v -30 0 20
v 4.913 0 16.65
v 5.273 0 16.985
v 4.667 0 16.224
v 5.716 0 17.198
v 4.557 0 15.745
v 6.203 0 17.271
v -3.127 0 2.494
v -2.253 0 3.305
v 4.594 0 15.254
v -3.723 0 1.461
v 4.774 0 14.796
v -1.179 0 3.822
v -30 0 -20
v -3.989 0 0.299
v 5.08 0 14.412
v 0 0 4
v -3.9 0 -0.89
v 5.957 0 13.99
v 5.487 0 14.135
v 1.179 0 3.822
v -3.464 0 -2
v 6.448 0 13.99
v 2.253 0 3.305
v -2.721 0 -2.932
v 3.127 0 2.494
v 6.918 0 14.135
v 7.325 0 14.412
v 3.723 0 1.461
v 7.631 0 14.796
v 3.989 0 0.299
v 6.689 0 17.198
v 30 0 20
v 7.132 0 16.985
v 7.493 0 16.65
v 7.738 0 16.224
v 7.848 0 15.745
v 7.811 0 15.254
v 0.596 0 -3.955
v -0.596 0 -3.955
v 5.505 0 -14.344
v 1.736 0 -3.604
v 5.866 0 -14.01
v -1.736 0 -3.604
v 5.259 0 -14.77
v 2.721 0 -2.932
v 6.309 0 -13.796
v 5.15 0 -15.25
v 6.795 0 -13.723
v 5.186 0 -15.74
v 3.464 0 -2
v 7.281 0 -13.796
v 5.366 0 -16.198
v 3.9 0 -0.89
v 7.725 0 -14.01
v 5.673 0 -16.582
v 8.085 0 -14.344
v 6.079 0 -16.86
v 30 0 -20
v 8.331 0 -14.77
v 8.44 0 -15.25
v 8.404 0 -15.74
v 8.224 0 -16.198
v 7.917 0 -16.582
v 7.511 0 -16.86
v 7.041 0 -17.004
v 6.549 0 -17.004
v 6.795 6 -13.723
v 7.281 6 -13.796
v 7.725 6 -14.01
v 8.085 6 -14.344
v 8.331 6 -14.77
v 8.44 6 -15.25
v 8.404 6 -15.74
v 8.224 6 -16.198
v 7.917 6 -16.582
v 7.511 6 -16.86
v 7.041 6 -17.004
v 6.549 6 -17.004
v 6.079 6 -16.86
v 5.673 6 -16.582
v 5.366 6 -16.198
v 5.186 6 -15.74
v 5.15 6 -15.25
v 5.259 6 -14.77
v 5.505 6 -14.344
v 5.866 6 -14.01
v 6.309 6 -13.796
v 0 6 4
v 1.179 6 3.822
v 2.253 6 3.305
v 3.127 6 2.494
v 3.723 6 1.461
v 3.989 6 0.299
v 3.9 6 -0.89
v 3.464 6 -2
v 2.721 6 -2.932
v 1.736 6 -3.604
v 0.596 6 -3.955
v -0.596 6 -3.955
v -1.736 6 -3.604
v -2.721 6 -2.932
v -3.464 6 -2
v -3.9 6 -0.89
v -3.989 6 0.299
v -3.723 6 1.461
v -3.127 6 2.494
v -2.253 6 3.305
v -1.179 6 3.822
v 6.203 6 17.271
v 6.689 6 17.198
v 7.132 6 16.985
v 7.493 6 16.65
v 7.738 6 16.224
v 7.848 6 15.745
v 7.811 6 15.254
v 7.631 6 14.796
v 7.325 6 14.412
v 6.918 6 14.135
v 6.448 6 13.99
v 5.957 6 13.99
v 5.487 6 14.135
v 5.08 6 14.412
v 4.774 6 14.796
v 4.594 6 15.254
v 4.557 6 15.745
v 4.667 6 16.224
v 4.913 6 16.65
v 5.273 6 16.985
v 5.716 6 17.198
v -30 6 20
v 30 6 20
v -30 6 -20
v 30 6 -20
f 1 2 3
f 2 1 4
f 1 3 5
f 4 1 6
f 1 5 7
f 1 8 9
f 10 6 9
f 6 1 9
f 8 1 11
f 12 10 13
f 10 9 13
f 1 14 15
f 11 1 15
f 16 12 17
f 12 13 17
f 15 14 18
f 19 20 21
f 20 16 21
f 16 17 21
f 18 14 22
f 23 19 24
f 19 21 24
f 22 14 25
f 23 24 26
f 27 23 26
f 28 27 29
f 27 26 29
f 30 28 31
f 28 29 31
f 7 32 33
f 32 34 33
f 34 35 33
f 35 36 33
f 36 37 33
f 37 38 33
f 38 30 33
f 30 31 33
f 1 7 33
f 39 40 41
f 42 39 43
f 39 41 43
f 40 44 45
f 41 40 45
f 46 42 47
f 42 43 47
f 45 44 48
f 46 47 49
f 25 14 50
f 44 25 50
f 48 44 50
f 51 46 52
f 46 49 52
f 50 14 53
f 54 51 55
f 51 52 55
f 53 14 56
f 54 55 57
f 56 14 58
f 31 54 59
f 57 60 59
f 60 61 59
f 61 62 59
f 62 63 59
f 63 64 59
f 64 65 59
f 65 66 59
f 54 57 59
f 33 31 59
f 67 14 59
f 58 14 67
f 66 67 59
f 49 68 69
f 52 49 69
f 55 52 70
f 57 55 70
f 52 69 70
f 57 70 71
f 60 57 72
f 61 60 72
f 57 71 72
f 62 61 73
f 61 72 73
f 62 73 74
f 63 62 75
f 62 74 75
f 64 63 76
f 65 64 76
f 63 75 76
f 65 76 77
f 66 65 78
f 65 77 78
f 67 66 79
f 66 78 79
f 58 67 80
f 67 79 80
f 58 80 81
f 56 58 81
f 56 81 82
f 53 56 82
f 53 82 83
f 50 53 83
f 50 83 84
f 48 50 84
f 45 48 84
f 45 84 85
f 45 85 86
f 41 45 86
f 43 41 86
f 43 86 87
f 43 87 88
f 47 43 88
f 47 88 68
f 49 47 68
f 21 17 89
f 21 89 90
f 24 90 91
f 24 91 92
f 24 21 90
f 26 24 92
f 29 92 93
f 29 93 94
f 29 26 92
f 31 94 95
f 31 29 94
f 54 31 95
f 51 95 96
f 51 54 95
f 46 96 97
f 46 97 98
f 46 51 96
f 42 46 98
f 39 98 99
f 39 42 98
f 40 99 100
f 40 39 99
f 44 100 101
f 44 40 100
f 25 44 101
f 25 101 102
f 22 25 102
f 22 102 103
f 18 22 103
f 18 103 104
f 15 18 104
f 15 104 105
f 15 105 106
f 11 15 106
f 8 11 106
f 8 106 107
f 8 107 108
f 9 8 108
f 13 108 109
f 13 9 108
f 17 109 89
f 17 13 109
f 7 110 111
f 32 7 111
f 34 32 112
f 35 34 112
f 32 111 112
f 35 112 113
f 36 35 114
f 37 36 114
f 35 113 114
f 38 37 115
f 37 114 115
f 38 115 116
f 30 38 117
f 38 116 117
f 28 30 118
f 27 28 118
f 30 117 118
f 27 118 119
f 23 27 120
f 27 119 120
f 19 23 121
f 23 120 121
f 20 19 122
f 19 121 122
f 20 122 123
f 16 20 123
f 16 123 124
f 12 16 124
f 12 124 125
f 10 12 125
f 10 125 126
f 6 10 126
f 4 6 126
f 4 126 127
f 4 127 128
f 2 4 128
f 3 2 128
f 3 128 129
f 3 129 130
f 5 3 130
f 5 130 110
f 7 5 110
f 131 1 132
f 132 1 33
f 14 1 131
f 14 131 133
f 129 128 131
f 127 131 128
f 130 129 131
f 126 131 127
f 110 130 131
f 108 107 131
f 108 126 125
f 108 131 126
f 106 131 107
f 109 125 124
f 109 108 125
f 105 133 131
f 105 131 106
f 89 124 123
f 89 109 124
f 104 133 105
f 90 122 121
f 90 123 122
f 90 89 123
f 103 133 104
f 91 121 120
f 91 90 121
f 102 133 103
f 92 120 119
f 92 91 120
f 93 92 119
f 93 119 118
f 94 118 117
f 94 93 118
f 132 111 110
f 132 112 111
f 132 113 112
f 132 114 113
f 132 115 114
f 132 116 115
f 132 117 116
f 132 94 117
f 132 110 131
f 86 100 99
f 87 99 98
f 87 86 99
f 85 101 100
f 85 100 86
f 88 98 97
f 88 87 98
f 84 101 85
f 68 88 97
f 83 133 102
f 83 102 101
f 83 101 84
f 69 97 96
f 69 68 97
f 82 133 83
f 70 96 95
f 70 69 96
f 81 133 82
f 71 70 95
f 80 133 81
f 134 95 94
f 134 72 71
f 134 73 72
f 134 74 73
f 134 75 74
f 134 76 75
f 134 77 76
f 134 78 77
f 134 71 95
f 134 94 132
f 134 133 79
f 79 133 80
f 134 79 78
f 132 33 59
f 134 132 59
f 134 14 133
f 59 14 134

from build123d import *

# Parameters (mm, degrees)
SKETCH1_W           = 60
SKETCH1_H           = 40
SKETCH1_R           = 4
BOSS_EXTRUDE1_DEPTH = 6
SKETCH2_R           = 1.65
CUT_EXTRUDE1_DEPTH  = 10


with BuildPart() as part:
    # Sketch1 → Boss-Extrude1 (new body)
    with BuildSketch(Plane(origin=(0, 0, 0), x_dir=(1, 0, 0), z_dir=(0, 1, 0))):
        Rectangle(SKETCH1_W, SKETCH1_H)
        with Locations(Location((0, 0, 0), (0, 0, 270))):
            Circle(SKETCH1_R, mode=Mode.SUBTRACT)
    extrude(amount=BOSS_EXTRUDE1_DEPTH)

    # Sketch2 → Cut-Extrude1 (cut)
    with BuildSketch(Plane(origin=(0, 6, 0), x_dir=(1, 0, 0), z_dir=(0, 1, 0))):
        with Locations(Location((6.795088799, 15.372923216, 0), (0, 0, 270))):
            Circle(SKETCH2_R)
        with Locations(Location((6.202536092, -15.621413061, 0), (0, 0, 270))):
            Circle(SKETCH2_R)
    extrude(amount=-CUT_EXTRUDE1_DEPTH, mode=Mode.SUBTRACT)


solid = part.part
